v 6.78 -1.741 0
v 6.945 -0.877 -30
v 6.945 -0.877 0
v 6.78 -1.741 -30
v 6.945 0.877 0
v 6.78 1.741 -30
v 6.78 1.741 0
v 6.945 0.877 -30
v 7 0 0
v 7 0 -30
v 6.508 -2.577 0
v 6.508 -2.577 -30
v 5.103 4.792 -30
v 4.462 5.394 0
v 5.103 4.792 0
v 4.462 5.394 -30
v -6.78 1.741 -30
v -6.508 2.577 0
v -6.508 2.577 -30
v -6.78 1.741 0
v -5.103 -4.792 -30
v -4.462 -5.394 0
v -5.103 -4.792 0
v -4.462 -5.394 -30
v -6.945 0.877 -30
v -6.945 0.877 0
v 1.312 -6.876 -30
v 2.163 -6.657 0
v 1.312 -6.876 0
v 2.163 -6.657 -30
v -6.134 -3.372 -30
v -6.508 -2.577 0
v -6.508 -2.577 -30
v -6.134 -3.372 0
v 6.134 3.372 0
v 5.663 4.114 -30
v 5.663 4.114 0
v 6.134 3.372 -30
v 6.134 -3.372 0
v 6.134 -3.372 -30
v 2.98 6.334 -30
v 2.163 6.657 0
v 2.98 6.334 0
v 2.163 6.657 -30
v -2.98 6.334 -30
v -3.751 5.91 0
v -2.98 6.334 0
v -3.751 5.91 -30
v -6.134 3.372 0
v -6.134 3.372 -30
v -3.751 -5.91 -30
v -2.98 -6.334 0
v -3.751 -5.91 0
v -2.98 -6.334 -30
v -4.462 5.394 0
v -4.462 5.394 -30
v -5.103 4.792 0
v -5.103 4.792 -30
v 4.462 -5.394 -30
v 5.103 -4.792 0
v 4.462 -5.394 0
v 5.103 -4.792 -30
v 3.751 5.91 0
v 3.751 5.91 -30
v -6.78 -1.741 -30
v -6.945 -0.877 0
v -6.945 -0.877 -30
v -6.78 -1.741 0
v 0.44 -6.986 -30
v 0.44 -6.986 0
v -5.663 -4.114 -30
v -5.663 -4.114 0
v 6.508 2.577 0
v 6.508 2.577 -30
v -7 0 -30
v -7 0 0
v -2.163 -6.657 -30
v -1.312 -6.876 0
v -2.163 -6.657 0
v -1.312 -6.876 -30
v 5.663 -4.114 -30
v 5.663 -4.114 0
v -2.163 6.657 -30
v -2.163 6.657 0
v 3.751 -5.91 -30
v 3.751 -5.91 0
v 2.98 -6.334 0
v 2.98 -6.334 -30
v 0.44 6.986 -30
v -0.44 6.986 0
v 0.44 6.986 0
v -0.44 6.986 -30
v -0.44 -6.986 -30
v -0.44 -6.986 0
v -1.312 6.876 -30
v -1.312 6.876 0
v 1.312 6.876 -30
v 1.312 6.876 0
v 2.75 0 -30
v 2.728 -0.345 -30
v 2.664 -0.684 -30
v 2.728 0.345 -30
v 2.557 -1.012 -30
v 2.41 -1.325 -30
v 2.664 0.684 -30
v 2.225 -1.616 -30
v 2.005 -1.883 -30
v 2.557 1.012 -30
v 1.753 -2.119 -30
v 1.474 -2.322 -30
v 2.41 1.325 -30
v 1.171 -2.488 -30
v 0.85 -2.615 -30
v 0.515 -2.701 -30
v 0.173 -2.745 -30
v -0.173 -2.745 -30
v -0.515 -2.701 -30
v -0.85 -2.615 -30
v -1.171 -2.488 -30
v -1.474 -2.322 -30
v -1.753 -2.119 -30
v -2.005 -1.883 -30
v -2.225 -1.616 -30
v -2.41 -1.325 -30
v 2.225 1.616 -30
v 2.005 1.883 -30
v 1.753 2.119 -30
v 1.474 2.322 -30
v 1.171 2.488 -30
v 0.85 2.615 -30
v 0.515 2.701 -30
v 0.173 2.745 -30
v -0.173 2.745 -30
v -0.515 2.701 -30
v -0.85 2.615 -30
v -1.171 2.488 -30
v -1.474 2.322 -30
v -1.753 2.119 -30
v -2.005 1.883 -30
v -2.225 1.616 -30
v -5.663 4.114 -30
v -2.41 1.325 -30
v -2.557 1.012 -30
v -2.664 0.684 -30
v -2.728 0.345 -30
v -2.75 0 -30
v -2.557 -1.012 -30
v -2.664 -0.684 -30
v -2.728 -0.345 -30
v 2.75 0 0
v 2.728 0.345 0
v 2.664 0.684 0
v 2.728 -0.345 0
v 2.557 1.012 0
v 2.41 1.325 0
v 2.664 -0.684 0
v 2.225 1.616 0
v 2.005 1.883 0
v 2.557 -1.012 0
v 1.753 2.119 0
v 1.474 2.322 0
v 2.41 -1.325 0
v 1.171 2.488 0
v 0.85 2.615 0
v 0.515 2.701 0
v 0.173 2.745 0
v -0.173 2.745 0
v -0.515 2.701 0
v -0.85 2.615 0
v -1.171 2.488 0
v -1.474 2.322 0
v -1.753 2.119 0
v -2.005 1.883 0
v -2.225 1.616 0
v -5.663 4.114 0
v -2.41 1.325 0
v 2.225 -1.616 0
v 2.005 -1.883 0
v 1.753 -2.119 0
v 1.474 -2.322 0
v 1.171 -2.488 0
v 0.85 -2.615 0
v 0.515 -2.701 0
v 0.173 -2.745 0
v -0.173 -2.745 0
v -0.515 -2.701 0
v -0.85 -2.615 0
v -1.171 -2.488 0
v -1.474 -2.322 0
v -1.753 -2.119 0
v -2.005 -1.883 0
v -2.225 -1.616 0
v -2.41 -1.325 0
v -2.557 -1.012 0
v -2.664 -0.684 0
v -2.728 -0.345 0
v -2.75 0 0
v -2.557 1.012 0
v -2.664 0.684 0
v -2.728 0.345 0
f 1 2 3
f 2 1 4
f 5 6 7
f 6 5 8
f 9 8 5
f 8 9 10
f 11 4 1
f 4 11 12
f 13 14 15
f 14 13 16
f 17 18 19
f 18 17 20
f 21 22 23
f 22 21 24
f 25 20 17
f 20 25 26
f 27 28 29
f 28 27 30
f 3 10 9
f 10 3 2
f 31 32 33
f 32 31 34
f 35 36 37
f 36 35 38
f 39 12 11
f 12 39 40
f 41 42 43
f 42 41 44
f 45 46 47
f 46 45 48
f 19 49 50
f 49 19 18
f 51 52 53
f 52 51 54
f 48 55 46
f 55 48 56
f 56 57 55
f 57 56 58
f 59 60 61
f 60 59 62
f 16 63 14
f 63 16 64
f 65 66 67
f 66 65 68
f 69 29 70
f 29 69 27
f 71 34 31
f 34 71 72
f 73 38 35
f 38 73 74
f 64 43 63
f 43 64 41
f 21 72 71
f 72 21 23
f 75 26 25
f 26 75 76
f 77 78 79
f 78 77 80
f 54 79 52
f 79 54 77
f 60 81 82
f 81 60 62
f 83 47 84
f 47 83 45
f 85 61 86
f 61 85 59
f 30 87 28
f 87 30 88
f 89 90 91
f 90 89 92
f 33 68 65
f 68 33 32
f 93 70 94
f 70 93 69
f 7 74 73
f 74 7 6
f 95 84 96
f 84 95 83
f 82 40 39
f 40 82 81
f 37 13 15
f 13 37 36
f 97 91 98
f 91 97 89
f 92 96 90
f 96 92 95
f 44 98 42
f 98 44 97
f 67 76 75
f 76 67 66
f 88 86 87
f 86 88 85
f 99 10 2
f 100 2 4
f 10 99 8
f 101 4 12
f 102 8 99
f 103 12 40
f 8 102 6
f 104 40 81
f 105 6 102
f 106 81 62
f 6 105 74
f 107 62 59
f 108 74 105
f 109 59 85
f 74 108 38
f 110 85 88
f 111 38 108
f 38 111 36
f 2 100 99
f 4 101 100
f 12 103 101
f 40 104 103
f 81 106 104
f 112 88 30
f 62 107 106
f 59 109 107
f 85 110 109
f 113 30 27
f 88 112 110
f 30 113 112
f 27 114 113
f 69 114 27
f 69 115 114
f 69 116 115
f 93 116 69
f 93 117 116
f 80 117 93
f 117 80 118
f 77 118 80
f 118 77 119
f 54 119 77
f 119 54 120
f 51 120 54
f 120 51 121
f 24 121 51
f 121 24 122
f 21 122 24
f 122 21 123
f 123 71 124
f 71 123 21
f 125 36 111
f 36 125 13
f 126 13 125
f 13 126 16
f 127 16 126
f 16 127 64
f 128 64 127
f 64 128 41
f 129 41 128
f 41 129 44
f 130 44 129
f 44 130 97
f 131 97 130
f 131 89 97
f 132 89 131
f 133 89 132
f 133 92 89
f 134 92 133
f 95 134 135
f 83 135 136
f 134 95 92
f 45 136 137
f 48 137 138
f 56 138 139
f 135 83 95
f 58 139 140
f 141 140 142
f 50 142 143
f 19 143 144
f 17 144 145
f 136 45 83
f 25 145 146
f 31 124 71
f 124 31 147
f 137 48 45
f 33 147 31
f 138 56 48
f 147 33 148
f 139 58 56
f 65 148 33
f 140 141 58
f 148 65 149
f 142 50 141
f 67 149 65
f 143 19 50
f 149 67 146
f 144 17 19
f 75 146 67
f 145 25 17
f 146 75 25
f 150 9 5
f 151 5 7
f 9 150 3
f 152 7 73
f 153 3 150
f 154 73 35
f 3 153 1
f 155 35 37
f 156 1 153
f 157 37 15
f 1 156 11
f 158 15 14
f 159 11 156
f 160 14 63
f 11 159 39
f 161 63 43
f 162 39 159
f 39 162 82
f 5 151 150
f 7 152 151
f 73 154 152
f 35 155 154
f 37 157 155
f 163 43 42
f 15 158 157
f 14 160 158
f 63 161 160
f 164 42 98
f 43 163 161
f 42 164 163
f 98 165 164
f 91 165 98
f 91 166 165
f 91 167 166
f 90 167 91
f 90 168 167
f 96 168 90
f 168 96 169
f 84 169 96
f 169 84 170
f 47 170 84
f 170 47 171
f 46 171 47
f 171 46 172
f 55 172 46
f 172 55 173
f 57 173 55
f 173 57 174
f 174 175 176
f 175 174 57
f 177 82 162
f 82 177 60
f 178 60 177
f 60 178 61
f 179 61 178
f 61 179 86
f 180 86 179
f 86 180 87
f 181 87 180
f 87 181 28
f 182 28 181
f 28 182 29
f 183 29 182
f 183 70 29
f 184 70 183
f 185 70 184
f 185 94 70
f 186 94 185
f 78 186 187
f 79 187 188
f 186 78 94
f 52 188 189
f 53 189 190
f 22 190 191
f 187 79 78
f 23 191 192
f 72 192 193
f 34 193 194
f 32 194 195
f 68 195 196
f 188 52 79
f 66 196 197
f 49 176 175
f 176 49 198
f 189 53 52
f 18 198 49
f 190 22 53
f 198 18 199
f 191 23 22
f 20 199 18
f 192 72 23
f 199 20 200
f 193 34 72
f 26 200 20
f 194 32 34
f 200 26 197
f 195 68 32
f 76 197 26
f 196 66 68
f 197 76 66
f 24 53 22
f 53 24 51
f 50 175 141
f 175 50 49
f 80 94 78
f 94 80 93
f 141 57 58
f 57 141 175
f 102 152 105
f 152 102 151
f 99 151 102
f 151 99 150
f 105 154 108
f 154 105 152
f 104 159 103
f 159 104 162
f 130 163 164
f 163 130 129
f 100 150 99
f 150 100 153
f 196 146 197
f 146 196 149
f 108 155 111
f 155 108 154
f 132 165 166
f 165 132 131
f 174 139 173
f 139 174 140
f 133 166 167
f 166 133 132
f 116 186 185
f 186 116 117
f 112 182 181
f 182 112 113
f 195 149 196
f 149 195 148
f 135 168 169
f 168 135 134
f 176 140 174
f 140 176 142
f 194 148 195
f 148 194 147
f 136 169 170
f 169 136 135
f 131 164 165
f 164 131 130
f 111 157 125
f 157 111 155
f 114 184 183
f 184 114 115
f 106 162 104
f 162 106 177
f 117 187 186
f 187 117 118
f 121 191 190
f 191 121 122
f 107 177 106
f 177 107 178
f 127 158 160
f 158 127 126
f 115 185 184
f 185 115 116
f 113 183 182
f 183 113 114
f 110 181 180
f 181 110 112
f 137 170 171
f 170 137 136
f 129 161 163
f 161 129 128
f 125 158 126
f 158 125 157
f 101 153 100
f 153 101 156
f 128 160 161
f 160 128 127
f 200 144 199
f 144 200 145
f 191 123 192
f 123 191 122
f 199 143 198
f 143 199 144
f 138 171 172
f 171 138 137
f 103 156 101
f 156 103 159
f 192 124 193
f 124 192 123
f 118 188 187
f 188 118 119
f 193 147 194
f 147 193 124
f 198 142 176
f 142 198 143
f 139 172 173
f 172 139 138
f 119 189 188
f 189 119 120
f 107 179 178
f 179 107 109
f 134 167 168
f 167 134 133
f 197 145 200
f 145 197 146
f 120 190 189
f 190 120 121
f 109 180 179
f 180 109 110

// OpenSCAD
$fn = 50;


difference() {
	union() {
		translate(v = [0, 0, -30.0000000000]) {
			cylinder(h = 30, r = 7.0000000000);
		}
		cylinder(h = 0, r = 17.0000000000);
	}
	union() {
		#translate(v = [0, 0, -30]) {
			cylinder(h = 30, r = 2.7500000000);
		}
	}
}
